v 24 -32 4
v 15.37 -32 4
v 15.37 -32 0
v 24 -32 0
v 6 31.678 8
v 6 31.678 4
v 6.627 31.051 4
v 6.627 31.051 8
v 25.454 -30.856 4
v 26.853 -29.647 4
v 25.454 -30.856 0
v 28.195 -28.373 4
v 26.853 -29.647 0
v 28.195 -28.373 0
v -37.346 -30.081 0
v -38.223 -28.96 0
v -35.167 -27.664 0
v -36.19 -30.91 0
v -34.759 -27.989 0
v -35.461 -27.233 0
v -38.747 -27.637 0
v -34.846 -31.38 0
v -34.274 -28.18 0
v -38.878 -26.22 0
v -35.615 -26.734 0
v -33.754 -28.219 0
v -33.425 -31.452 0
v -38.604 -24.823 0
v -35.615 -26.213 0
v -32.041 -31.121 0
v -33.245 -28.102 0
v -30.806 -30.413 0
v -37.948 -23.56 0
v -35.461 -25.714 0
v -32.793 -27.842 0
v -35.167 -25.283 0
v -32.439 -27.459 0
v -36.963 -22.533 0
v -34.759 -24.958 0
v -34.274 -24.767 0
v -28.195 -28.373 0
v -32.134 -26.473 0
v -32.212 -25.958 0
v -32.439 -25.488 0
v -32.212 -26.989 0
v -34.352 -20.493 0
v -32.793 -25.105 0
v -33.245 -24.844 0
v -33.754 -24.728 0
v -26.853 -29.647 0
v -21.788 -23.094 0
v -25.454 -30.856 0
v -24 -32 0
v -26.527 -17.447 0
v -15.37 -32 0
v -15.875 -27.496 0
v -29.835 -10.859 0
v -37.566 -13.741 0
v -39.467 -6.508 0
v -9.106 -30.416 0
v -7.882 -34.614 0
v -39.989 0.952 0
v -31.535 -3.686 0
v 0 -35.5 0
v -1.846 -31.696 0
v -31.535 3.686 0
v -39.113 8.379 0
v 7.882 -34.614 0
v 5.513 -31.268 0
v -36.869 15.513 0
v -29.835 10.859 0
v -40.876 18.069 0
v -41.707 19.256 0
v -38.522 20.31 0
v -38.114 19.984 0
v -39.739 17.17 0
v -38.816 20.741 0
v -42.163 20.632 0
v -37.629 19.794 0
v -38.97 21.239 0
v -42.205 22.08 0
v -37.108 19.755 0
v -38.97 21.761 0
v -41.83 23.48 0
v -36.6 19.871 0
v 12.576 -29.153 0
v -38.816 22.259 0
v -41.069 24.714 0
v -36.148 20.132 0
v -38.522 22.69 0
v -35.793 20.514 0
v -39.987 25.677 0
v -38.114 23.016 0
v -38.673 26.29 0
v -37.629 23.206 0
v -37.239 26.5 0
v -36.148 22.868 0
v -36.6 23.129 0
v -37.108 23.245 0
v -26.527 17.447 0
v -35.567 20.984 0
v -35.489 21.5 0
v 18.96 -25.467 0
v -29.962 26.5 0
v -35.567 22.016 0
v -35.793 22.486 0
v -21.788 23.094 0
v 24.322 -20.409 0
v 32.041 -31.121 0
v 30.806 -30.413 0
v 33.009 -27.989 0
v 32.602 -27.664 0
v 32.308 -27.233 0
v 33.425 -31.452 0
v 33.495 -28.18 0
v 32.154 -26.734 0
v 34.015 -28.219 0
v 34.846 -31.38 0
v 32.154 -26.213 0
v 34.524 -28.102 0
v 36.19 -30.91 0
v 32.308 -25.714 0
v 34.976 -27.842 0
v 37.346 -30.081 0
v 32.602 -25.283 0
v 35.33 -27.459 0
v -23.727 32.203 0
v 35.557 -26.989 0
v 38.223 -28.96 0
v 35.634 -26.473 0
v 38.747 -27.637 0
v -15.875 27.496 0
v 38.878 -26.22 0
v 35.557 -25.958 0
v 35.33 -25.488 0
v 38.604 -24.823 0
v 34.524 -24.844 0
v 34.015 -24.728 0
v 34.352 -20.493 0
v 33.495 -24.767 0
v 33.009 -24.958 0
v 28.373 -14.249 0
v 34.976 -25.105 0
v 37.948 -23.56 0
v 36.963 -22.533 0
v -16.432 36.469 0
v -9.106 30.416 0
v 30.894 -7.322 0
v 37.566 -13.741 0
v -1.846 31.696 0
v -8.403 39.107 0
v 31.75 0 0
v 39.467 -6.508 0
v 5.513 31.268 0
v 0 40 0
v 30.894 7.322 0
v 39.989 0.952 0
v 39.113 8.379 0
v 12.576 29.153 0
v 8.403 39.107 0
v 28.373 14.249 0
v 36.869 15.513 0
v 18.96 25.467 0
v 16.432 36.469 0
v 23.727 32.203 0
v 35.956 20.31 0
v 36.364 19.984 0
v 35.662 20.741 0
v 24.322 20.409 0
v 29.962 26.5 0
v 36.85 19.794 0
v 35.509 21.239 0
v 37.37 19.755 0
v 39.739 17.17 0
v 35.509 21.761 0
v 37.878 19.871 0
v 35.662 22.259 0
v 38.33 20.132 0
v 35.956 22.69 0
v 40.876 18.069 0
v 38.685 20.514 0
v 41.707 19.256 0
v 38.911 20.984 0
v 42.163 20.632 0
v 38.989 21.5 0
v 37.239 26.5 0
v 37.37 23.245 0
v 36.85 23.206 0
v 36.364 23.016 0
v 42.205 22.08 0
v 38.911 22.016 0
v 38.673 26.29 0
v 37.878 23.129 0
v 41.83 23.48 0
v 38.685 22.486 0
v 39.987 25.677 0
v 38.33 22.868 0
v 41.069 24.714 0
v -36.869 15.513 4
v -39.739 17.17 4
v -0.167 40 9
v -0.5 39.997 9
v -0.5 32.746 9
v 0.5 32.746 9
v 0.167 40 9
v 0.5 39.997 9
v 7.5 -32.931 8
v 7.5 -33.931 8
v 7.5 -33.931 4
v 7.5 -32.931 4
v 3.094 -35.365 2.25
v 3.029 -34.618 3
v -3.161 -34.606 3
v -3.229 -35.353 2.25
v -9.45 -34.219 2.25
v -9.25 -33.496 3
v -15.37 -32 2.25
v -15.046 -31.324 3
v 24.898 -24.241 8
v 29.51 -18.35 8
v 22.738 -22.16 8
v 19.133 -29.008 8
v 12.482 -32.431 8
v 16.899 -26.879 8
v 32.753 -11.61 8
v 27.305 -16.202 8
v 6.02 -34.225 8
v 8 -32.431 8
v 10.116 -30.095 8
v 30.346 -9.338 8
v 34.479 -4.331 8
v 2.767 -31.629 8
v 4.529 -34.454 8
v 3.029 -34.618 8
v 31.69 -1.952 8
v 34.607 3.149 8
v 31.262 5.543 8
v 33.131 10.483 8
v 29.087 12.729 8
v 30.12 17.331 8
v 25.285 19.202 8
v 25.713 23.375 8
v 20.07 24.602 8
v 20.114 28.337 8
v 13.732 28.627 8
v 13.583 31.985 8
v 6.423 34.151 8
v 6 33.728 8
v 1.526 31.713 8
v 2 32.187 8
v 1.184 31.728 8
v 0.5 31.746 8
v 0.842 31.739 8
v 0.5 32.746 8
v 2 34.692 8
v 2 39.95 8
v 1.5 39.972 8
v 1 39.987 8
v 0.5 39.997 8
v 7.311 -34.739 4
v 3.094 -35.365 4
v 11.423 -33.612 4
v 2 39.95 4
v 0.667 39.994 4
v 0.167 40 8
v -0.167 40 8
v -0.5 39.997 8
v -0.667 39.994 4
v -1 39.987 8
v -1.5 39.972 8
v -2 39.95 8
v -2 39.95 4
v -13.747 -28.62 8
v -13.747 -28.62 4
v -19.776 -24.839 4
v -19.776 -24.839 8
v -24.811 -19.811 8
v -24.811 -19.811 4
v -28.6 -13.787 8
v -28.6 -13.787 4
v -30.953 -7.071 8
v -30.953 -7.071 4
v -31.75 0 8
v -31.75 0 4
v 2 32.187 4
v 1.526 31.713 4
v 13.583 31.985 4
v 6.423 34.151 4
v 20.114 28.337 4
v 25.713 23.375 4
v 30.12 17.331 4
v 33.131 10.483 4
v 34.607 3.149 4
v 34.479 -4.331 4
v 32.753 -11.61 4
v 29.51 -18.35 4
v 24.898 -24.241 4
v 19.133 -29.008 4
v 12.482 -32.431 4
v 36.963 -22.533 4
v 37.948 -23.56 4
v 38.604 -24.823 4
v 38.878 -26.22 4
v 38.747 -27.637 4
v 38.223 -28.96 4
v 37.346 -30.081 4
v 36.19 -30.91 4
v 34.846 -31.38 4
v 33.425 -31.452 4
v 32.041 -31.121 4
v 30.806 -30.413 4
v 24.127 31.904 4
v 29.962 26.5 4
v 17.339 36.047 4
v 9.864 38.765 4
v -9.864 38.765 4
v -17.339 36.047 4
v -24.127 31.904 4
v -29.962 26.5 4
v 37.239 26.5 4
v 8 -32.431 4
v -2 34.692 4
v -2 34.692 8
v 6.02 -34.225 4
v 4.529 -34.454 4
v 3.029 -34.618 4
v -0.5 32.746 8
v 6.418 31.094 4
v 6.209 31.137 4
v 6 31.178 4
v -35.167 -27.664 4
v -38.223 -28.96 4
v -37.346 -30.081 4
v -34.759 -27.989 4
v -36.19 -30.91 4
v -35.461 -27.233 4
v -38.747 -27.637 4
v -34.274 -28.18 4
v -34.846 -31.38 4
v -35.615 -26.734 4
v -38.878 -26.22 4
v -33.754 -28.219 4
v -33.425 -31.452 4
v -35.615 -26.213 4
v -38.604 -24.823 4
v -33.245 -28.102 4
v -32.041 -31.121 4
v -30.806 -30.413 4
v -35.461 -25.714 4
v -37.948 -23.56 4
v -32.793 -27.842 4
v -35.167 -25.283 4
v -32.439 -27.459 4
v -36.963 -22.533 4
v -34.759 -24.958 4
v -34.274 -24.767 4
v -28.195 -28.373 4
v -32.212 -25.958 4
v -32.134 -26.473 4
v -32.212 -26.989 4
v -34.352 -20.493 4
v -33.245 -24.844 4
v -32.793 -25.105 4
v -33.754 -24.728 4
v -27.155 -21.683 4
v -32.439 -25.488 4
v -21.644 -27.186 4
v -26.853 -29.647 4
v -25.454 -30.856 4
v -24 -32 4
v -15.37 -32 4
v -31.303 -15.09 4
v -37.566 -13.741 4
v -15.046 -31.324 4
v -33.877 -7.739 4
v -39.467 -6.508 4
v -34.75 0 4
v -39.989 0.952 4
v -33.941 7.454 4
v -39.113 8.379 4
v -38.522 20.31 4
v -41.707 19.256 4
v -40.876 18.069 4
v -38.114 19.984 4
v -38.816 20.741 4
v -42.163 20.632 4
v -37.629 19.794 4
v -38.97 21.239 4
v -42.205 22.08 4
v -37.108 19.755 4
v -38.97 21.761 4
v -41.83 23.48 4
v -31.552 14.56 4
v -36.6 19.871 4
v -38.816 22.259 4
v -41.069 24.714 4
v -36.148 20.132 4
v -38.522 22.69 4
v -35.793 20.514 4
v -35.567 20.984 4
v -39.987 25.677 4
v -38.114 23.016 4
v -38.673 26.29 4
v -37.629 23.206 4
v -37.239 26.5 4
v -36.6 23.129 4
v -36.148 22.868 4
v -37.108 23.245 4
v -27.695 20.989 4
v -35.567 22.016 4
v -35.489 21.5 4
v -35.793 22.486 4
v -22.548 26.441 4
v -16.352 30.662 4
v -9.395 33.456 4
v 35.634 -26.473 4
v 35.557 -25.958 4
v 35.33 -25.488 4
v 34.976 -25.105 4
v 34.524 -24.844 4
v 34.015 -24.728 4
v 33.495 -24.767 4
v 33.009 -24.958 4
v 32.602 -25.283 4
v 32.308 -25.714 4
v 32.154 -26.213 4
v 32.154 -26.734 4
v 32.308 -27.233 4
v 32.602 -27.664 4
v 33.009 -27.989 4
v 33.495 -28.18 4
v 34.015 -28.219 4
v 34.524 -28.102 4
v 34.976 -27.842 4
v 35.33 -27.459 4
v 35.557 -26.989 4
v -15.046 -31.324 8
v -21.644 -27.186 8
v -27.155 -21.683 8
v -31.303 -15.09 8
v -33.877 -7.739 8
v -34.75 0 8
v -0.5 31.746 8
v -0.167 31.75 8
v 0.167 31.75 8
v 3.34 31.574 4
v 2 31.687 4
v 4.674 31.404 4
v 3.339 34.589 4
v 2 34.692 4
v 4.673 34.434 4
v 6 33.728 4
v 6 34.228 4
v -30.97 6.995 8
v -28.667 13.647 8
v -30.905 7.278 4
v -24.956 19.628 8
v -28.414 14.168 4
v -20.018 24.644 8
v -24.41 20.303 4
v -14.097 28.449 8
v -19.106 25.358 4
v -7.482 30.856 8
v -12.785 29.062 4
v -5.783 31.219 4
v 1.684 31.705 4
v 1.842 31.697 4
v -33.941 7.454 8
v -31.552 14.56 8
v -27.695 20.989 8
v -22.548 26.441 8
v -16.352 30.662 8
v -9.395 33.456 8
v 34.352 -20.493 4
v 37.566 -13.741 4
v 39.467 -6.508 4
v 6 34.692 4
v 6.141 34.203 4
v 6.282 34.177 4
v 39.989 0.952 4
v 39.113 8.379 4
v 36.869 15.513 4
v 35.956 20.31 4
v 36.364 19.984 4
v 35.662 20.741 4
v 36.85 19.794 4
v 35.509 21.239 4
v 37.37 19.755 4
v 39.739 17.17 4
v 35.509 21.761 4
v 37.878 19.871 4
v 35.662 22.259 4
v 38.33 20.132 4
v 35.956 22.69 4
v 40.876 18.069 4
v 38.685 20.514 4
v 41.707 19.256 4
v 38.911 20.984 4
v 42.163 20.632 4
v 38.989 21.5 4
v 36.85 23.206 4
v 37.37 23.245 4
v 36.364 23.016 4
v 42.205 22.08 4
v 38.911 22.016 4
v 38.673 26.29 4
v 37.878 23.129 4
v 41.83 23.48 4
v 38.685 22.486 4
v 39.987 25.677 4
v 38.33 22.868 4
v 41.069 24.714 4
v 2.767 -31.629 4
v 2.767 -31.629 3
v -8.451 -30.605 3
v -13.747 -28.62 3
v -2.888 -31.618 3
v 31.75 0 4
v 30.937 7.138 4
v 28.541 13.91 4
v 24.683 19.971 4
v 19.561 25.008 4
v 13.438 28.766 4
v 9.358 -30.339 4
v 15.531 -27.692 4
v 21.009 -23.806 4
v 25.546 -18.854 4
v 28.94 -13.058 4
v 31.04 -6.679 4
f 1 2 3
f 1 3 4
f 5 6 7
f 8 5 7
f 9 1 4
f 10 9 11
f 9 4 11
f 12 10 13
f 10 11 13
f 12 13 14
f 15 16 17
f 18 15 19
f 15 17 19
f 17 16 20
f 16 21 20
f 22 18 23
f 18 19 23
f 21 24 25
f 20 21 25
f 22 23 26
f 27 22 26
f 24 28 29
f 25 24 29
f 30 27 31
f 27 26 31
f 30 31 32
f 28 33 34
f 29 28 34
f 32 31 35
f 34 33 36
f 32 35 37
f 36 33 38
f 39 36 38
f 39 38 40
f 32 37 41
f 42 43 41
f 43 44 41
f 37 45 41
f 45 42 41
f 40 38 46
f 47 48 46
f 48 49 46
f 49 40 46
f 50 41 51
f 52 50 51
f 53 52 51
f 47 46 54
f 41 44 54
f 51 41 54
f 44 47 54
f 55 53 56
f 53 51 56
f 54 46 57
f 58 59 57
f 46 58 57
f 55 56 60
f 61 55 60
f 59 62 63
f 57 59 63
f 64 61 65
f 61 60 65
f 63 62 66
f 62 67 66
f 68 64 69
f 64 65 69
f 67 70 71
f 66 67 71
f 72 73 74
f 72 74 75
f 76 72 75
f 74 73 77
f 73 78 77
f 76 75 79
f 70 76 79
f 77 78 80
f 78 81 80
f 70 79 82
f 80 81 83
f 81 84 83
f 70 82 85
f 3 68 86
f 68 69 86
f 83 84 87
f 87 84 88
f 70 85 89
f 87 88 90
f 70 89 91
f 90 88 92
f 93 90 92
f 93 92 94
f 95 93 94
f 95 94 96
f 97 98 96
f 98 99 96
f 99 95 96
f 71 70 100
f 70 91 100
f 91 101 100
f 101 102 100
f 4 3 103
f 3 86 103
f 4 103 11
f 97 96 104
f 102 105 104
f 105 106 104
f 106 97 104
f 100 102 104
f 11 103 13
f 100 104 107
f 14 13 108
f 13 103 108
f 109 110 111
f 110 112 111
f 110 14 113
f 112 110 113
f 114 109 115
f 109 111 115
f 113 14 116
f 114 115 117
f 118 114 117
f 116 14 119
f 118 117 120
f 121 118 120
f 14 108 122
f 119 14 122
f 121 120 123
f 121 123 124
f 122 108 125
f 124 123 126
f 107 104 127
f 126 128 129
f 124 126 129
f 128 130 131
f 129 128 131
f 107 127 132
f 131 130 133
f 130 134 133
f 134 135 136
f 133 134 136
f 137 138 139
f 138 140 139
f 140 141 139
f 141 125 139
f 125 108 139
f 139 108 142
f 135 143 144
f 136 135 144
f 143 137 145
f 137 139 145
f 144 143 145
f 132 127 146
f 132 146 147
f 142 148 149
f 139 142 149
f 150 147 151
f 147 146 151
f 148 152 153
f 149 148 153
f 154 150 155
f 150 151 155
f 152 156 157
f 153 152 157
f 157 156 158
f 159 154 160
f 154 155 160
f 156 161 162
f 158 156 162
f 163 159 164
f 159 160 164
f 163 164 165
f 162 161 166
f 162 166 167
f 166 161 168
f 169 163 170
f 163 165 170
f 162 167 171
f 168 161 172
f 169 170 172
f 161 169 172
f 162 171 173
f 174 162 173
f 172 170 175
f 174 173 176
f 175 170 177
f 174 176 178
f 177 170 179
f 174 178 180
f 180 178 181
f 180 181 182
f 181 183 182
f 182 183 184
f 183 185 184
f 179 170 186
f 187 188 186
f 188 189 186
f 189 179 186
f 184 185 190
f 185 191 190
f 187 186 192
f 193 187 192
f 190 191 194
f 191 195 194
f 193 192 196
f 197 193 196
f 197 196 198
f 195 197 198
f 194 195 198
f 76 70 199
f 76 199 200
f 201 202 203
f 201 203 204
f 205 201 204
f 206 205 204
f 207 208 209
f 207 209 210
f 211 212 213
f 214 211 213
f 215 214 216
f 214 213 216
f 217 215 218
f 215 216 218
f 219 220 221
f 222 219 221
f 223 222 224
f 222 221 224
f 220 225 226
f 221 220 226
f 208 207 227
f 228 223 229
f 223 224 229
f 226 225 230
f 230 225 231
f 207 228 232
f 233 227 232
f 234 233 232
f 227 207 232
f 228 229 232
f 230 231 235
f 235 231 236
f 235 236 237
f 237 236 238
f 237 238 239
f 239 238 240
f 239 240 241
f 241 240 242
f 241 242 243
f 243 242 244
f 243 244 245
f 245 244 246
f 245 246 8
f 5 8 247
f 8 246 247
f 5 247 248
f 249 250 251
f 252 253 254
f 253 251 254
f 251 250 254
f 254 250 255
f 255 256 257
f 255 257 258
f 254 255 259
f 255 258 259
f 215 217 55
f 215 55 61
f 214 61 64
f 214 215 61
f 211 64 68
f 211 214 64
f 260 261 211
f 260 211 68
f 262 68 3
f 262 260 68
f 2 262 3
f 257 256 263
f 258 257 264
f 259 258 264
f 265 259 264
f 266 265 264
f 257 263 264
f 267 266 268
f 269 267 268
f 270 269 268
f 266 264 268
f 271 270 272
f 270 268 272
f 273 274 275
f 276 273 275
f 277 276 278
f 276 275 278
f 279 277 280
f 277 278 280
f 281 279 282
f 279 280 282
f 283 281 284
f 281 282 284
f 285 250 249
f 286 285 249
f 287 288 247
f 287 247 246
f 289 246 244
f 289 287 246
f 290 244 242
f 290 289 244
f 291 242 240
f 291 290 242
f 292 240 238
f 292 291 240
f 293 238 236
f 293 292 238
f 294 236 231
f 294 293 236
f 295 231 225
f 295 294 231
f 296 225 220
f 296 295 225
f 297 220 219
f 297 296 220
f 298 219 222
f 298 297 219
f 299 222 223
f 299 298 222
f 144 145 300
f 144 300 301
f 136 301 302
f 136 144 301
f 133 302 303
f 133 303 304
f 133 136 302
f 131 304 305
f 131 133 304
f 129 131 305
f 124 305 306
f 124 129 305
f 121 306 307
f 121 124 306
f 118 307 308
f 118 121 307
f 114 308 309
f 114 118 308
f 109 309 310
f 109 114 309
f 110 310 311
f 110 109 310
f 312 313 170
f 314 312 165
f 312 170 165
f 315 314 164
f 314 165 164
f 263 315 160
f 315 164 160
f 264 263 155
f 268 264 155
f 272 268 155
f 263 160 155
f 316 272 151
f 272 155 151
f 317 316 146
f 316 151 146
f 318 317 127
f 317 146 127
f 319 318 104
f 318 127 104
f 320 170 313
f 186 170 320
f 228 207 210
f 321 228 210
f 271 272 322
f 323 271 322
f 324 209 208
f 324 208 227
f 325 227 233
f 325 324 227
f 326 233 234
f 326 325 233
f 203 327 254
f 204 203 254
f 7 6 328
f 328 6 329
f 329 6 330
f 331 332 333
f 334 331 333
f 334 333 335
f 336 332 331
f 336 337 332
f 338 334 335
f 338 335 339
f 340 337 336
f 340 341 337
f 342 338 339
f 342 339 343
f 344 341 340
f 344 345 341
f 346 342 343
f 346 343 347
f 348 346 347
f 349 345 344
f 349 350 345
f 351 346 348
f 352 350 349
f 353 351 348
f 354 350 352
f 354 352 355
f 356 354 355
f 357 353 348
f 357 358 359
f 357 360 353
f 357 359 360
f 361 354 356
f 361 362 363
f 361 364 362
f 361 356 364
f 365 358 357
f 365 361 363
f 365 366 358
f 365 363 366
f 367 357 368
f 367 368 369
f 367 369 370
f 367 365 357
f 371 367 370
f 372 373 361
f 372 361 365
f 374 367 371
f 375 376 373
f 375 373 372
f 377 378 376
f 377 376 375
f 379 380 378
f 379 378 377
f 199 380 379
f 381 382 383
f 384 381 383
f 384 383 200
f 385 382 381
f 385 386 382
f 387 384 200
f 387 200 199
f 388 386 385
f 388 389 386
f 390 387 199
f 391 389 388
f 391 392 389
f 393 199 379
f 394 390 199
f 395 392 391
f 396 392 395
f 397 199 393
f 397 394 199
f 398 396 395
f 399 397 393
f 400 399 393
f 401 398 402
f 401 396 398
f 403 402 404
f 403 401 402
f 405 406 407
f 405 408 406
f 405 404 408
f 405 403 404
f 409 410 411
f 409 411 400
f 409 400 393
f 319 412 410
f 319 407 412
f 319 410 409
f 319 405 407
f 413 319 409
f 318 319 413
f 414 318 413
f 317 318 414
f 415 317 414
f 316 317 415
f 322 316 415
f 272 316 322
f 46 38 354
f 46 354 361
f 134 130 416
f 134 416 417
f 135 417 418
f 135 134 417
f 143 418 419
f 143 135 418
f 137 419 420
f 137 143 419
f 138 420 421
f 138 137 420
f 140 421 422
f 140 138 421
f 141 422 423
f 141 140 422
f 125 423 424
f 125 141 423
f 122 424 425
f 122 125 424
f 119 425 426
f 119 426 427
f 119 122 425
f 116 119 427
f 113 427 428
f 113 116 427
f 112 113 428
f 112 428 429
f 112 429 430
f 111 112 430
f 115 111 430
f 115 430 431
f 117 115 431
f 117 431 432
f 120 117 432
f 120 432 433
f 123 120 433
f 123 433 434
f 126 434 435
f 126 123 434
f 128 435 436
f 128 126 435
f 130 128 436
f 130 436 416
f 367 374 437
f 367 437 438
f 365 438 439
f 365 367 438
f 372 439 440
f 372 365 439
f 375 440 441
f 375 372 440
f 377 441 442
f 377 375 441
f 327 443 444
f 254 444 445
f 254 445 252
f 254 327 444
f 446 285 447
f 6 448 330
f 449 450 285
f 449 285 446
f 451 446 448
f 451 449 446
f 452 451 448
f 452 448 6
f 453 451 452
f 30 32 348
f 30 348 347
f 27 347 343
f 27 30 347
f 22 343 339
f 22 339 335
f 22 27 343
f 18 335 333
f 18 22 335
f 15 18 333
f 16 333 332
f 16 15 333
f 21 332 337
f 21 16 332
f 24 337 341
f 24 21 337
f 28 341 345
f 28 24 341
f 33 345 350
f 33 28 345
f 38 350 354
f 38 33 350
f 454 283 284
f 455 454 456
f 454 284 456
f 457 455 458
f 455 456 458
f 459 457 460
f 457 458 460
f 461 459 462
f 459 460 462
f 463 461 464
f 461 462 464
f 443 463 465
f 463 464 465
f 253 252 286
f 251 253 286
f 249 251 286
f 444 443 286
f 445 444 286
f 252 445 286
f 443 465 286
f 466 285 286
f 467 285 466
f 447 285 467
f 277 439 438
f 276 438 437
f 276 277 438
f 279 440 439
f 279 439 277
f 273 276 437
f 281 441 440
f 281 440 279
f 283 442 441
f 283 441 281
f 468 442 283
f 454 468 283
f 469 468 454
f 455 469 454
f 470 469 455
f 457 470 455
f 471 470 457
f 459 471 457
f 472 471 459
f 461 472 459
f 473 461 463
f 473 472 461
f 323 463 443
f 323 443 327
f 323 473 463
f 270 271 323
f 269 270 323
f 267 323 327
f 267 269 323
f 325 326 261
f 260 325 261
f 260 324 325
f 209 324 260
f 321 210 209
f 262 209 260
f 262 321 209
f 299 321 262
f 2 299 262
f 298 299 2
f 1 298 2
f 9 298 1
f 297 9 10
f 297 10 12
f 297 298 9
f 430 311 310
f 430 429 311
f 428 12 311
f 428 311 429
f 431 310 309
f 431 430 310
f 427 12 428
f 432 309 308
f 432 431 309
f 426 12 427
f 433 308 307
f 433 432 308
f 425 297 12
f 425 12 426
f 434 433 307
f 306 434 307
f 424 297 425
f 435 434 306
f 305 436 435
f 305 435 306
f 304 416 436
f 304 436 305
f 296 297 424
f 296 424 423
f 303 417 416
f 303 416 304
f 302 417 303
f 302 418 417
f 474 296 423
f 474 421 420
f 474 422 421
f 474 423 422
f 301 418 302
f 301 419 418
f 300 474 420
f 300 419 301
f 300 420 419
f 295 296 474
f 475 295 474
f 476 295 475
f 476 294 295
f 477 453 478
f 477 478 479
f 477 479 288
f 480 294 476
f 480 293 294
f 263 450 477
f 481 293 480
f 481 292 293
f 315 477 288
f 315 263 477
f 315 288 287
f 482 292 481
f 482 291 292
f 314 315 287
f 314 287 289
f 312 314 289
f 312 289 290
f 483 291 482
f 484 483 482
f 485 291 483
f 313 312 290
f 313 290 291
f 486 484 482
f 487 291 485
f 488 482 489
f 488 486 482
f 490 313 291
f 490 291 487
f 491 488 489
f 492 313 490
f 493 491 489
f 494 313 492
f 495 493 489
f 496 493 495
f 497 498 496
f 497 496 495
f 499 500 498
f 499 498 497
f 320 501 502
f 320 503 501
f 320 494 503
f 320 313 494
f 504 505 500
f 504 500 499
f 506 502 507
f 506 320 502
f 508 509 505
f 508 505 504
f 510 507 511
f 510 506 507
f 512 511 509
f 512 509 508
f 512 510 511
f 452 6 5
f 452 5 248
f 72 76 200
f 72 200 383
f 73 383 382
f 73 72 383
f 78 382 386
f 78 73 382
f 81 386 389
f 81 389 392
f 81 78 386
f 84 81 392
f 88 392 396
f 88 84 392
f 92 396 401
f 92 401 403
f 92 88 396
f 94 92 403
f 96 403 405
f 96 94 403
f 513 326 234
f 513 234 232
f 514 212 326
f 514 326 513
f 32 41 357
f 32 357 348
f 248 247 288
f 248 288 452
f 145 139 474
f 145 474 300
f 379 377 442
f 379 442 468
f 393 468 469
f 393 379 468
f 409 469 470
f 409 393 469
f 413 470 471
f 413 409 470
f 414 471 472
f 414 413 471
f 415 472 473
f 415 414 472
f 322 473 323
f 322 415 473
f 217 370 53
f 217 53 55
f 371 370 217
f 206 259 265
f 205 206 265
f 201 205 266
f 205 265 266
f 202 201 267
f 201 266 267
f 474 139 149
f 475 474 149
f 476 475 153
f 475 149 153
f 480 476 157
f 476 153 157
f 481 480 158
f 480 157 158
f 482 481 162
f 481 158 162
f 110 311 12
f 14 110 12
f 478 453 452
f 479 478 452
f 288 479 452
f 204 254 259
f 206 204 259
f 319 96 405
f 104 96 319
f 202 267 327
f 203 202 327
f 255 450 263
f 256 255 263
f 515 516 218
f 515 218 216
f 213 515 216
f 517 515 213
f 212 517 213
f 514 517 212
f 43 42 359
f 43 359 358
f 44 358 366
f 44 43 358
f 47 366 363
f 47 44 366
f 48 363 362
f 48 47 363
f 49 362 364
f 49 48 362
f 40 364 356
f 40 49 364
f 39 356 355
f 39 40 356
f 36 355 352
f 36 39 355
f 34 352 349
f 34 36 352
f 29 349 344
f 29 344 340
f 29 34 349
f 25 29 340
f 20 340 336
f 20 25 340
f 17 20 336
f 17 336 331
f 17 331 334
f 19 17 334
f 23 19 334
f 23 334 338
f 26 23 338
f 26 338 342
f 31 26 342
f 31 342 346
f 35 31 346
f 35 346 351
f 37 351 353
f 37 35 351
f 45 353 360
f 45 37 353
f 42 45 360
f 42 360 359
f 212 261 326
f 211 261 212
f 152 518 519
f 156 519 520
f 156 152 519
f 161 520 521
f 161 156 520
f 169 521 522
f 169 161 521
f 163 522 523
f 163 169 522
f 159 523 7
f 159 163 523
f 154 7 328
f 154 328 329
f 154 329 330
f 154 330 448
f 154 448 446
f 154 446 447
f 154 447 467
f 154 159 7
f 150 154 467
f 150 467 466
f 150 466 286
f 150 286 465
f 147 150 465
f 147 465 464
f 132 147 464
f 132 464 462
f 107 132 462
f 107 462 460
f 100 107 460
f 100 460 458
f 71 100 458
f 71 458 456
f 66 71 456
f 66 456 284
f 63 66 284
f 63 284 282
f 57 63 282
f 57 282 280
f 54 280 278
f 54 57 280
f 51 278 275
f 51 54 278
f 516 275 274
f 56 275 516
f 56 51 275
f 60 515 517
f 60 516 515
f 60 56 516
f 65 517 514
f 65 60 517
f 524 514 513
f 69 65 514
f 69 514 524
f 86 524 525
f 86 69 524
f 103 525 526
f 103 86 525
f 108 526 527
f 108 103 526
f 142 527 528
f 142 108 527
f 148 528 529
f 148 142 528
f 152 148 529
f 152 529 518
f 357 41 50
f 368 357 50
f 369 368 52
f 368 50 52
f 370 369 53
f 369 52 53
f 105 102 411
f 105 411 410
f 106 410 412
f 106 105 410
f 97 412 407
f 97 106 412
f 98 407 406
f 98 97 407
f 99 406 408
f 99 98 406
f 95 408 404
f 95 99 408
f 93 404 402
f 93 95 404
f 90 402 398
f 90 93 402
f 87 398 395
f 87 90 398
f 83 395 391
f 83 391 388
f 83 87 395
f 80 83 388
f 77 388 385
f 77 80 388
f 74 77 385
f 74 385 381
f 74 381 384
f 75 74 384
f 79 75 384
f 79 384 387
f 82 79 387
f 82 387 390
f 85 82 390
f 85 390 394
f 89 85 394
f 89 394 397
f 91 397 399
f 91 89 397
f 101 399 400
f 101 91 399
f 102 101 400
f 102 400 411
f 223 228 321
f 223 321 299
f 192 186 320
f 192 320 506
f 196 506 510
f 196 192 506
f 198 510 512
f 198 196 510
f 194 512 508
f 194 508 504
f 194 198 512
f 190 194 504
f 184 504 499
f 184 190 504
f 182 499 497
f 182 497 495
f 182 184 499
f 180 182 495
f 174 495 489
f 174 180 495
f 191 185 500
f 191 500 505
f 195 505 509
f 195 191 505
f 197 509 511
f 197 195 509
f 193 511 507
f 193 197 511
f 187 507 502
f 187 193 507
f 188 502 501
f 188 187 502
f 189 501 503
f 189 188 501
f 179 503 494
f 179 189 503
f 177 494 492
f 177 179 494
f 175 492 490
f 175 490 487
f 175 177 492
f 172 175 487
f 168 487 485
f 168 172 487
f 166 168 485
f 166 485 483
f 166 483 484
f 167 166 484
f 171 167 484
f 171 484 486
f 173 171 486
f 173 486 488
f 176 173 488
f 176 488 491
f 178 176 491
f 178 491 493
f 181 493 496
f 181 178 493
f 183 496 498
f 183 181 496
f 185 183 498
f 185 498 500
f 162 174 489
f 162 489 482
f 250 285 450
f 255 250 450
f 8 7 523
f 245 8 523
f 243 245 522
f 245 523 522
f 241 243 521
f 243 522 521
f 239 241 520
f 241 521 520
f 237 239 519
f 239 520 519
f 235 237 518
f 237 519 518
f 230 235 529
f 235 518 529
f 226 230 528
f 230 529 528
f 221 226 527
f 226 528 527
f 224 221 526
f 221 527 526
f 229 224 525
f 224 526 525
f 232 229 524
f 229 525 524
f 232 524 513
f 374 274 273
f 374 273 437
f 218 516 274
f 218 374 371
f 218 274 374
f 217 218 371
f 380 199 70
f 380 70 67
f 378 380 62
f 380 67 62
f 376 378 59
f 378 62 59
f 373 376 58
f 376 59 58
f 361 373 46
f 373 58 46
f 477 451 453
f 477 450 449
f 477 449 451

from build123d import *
from build123d.topology import SkipClean

# Parameters (mm, degrees)
SKETCH_1_R          = 40
SKETCH_1_R_2        = 31.75
EXTRUDE_1_DEPTH     = 4
EXTRUDE_START       = -4
SKETCH_2_R          = 1.75
EXTRUDE_2_DEPTH     = 4
CUT_EXTRUDE_2_DEPTH = 57.709787515
SKETCH_4_R          = 1.75
EXTRUDE_3_DEPTH     = 4
SKETCH_5_R          = 34.75
SKETCH_5_R_2        = 31.75
EXTRUDE_4_DEPTH     = 4
CUT_EXTRUDE_3_DEPTH = 59.310727346
EXTRUDE_5_DEPTH     = 4
EXTRUDE_6_DEPTH     = 1
CUT_EXTRUDE_START   = -2
CUT_EXTRUDE_4_DEPTH = 2
CUT_EXTRUDE_START_2 = -1
CUT_EXTRUDE_5_DEPTH = 1
CHAMFER_1_SIZE      = 1
SKETCH_11_W         = 4.981706152
SKETCH_11_H         = 1.5
CUT_EXTRUDE_6_DEPTH = 4
CHAMFER_2_SIZE      = 0.5
SKETCH_12_W         = 4
SKETCH_12_H         = 3.514481439
CUT_EXTRUDE_7_DEPTH = 4
CHAMFER_3_SIZE      = 0.5
SKETCH_13_W         = 1
SKETCH_13_H         = 1
CUT_EXTRUDE_8_DEPTH = 1


with BuildPart() as part:
    # 草图1 → 凸台-拉伸1 (new body)
    with BuildSketch(Plane.XY):
        Circle(SKETCH_1_R)
        Circle(SKETCH_1_R_2, mode=Mode.SUBTRACT)
    extrude(amount=EXTRUDE_1_DEPTH)

    # 草图2 → 凸台-拉伸2 (add)
    # profile 1 of 2: a face of its own
    with BuildSketch(Plane.XY.offset(4).offset(EXTRUDE_START)):
        with BuildLine():
            Line((-36.962769782, -22.533389671), (-34.351514644, -20.493253565))
            ThreePointArc((-34.351514644, -20.493253565), (-31.520430144, -24.626459013), (-28.194899891, -28.373361101))
            Line((-28.194899891, -28.373361101), (-30.806155028, -30.413497207))
            ThreePointArc((-30.806155028, -30.413497207), (-37.824516173, -29.551750816), (-36.962769782, -22.533389671))
        make_face()
        with Locations((-33.884462405, -26.473443439)):
            Circle(SKETCH_2_R, mode=Mode.SUBTRACT)
    # profile 2 of 2: a face of its own
    with BuildSketch(Plane.XY.offset(4).offset(EXTRUDE_START)):
        with BuildLine():
            Line((30.806155028, -30.413497207), (28.194899891, -28.373361101))
            ThreePointArc((28.194899891, -28.373361101), (31.520430144, -24.626459013), (34.351514644, -20.493253565))
            Line((34.351514644, -20.493253565), (36.962769782, -22.533389671))
            ThreePointArc((36.962769782, -22.533389671), (37.824516173, -29.551750816), (30.806155028, -30.413497207))
        make_face()
        with Locations((33.884462405, -26.473443439)):
            Circle(SKETCH_2_R, mode=Mode.SUBTRACT)
    extrude(amount=EXTRUDE_2_DEPTH)

    # 草图3 → 切除-拉伸2 (cut, through all)
    with BuildSketch(Plane.XY.offset(4)):
        with BuildLine():
            Line((-24, -32), (-15.370426149, -32))
            ThreePointArc((-15.370426149, -32), (0, -35.5), (15.370426149, -32))
            Line((15.370426149, -32), (24, -32))
            ThreePointArc((24, -32), (0, -40), (-24, -32))
        make_face()
    extrude(amount=-CUT_EXTRUDE_2_DEPTH, mode=Mode.SUBTRACT)

    # 草图4 → 凸台-拉伸3 (add)
    # profile 1 of 2: a face of its own
    with BuildSketch(Plane.XY.offset(4).offset(EXTRUDE_START)):
        with BuildLine():
            Line((-37.239092363, 26.5), (-29.962476533, 26.5))
            ThreePointArc((-29.962476533, 26.5), (-33.86444566, 21.288478578), (-36.869317712, 15.513007814))
            Line((-36.869317712, 15.513007814), (-39.739092363, 17.169872981))
            ThreePointArc((-39.739092363, 17.169872981), (-42.068721494, 22.794095226), (-37.239092363, 26.5))
        make_face()
        with Locations((-37.239092363, 21.5)):
            Circle(SKETCH_4_R, mode=Mode.SUBTRACT)
    # profile 2 of 2: a face of its own
    with BuildSketch(Plane.XY.offset(4).offset(EXTRUDE_START)):
        with BuildLine():
            Line((39.739092363, 17.169872981), (36.869317712, 15.513007814))
            ThreePointArc((36.869317712, 15.513007814), (33.86444566, 21.288478578), (29.962476533, 26.5))
            Line((29.962476533, 26.5), (37.239092363, 26.5))
            ThreePointArc((37.239092363, 26.5), (42.068721494, 22.794095226), (39.739092363, 17.169872981))
        make_face()
        with Locations((37.239092363, 21.5)):
            Circle(SKETCH_4_R, mode=Mode.SUBTRACT)
    extrude(amount=EXTRUDE_3_DEPTH)

    # 草图5 → 凸台-拉伸4 (add)
    with BuildSketch(Plane(origin=(0, 0, 4), x_dir=(-1, 0, 0), z_dir=(0, 0, -1))):
        Circle(SKETCH_5_R)
        Circle(SKETCH_5_R_2, mode=Mode.SUBTRACT)
    extrude(amount=-EXTRUDE_4_DEPTH)

    # 草图6 → 切除-拉伸3 (cut, through all)
    with SkipClean():  # the faces are left unmerged after this step: merging them gives an invalid solid
        with BuildSketch(Plane.XY.offset(4)):
            with BuildLine():
                Line((-15.045698836, -31.323943662), (-13.746789584, -28.61971831))
                ThreePointArc((-13.746789584, -28.61971831), (-5.692283606, -31.235563183), (2.767194832, -31.629181664))
                Line((2.767194832, -31.629181664), (3.02866206, -34.617765759))
                ThreePointArc((3.02866206, -34.617765759), (-6.230137175, -34.18695498), (-15.045698836, -31.323943662))
            make_face()
        extrude(amount=CUT_EXTRUDE_3_DEPTH, mode=Mode.SUBTRACT)

    # 草图7 → 凸台-拉伸5 (add)
    with SkipClean():  # the faces are left unmerged after this step: merging them gives an invalid solid
        with BuildSketch(Plane.XY.offset(4)):
            with BuildLine():
                Line((-2, 39.949968711), (-2, 34.692398303))
                ThreePointArc((-2, 34.692398303), (0, 34.75), (2, 34.692398303))
                Line((2, 34.692398303), (2, 39.949968711))
                ThreePointArc((2, 39.949968711), (0, 40), (-2, 39.949968711))
            make_face()
        extrude(amount=EXTRUDE_5_DEPTH)

    # 草图8 → 凸台-拉伸6 (add)
    with SkipClean():  # the faces are left unmerged after this step: merging them gives an invalid solid
        with BuildSketch(Plane.XY.offset(8)):
            with BuildLine():
                Line((-0.5, 39.996874878), (-0.5, 31.746062748))
                ThreePointArc((-0.5, 31.746062748), (0, 31.75), (0.5, 31.746062748))
                Line((0.5, 31.746062748), (0.5, 39.996874878))
                ThreePointArc((0.5, 39.996874878), (0, 40), (-0.5, 39.996874878))
            make_face()
        extrude(amount=EXTRUDE_6_DEPTH)

    # 草图9 → 切除-拉伸4 (cut)
    with SkipClean():  # the faces are left unmerged after this step: merging them gives an invalid solid
        with BuildSketch(Plane.XY.offset(4).offset(CUT_EXTRUDE_START)):
            with BuildLine():
                Line((-15.045698836, -31.323943662), (-15.370426149, -32))
                ThreePointArc((-15.370426149, -32), (-6.364600567, -34.924802929), (3.094028868, -35.364911782))
                Line((3.094028868, -35.364911782), (3.02866206, -34.617765759))
                ThreePointArc((3.02866206, -34.617765759), (-6.230137175, -34.18695498), (-15.045698836, -31.323943662))
            make_face()
        extrude(amount=CUT_EXTRUDE_4_DEPTH, mode=Mode.SUBTRACT)

    # 草图10 → 切除-拉伸5 (cut)
    with BuildSketch(Plane.XY.offset(4).offset(CUT_EXTRUDE_START_2)):
        with BuildLine():
            Line((3.02866206, -34.617765759), (2.767194832, -31.629181664))
            ThreePointArc((2.767194832, -31.629181664), (-5.692283606, -31.235563183), (-13.746789584, -28.61971831))
            Line((-13.746789584, -28.61971831), (-15.045698836, -31.323943662))
            ThreePointArc((-15.045698836, -31.323943662), (-6.230137175, -34.18695498), (3.02866206, -34.617765759))
        make_face()
    extrude(amount=CUT_EXTRUDE_5_DEPTH, mode=Mode.SUBTRACT)

    # 倒角1
    # the kernel refuses this chamfer: 1 mm, written as the material it adds along each edge
    with BuildSketch(Plane(origin=(0, 0, 2), x_dir=(0.1605769660987581, -0.9870233218918986, 0), z_dir=(0.9870233218918986, 0.1605769660987581, 0))) as chamfer_1_piece_1_section:
        Polygon((34.75 + CHAMFER_1_SIZE, 0), (34.75, -CHAMFER_1_SIZE), (34.75, 0), align=None)
    chamfer_1_piece_1 = revolve(axis=Axis((0, 0, 2), (0, 0, -1)), revolution_arc=39.1369501, mode=Mode.PRIVATE)
    chamfer_1_piece_1 = chamfer_1_piece_1 & Plane(origin=(0, 0, 2), x_dir=(-0.4329697506743493, -0.9014084507042253, 0), z_dir=(0, 0, 1)) * Cylinder(35.5, 143, mode=Mode.PRIVATE)
    add(chamfer_1_piece_1)

    # 草图11 → 切除-拉伸6 (cut)
    with BuildSketch(Plane.XY.offset(8)):
        with Locations((9.990853076, -33.180996154)):
            Rectangle(SKETCH_11_W, SKETCH_11_H)
    extrude(amount=-CUT_EXTRUDE_6_DEPTH, mode=Mode.SUBTRACT)

    # 倒角2
    chamfer_2_edges = [part.edges().sort_by_distance(p)[0] for p in [
        (7.5, -32.430996154, 6),
    ]]
    chamfer(chamfer_2_edges, length=CHAMFER_2_SIZE)

    # 草图12 → 切除-拉伸7 (cut)
    with BuildSketch(Plane.XY.offset(4)):
        with Locations((4, 32.935157584)):
            Rectangle(SKETCH_12_W, SKETCH_12_H)
    extrude(amount=CUT_EXTRUDE_7_DEPTH, mode=Mode.SUBTRACT)

    # 倒角3
    # the kernel refuses this chamfer: 0.630512845, 0.5, 0.471250803, 0.431912073 mm, written as the material it takes off along each edge
    with BuildSketch(Plane(origin=(2, 31.686945261, 9.285841494), x_dir=(0, 1, 0), z_dir=(0, 0, -1))) as chamfer_3_piece_1:
        with BuildLine():
            Line((CHAMFER_3_SIZE, 0), (0.026344876, -0.473655124))
            ThreePointArc((0.026344876, -0.473655124), (0.014426752, -0.243437323), (0, 0))
            Line((0, 0), (CHAMFER_3_SIZE, 0))
        make_face()
    extrude(amount=5.285841494, mode=Mode.SUBTRACT)
    with BuildSketch(Plane(origin=(6, 34.228095185, 9.285841494), x_dir=(0.9838938998328699, -0.17875344436308485, 0), z_dir=(0, 0, -1))) as chamfer_3_piece_2:
        with BuildLine():
            Line((0.430053019, 0), (CHAMFER_3_SIZE * 0.178753444363, CHAMFER_3_SIZE * 0.983893899833))
            Line((CHAMFER_3_SIZE * 0.178753444363, CHAMFER_3_SIZE * 0.983893899833), (0, 0))
            ThreePointArc((0, 0), (0.220718474, -0.000664812), (0.430053019, 0))
        make_face()
    extrude(amount=5.285841494, mode=Mode.SUBTRACT)
    with BuildSketch(Plane(origin=(6, 31.177916864, 4), x_dir=(0, 1, 0), z_dir=(0, 0, 1))) as chamfer_3_piece_3:
        with BuildLine():
            Line((CHAMFER_3_SIZE, 0), (-0.127287982, -0.627287982))
            ThreePointArc((-0.127287982, -0.627287982), (-0.064155933, -0.324269183), (0, 0))
            Line((0, 0), (CHAMFER_3_SIZE, 0))
        make_face()
    extrude(amount=5.653107156, mode=Mode.SUBTRACT)

    # 草图13 → 切除-拉伸8 (cut)
    with BuildSketch(Plane.XY.offset(8)):
        with Locations((0, 32.246062748)):
            Rectangle(SKETCH_13_W, SKETCH_13_H)
    extrude(amount=CUT_EXTRUDE_8_DEPTH, mode=Mode.SUBTRACT)


solid = part.part
